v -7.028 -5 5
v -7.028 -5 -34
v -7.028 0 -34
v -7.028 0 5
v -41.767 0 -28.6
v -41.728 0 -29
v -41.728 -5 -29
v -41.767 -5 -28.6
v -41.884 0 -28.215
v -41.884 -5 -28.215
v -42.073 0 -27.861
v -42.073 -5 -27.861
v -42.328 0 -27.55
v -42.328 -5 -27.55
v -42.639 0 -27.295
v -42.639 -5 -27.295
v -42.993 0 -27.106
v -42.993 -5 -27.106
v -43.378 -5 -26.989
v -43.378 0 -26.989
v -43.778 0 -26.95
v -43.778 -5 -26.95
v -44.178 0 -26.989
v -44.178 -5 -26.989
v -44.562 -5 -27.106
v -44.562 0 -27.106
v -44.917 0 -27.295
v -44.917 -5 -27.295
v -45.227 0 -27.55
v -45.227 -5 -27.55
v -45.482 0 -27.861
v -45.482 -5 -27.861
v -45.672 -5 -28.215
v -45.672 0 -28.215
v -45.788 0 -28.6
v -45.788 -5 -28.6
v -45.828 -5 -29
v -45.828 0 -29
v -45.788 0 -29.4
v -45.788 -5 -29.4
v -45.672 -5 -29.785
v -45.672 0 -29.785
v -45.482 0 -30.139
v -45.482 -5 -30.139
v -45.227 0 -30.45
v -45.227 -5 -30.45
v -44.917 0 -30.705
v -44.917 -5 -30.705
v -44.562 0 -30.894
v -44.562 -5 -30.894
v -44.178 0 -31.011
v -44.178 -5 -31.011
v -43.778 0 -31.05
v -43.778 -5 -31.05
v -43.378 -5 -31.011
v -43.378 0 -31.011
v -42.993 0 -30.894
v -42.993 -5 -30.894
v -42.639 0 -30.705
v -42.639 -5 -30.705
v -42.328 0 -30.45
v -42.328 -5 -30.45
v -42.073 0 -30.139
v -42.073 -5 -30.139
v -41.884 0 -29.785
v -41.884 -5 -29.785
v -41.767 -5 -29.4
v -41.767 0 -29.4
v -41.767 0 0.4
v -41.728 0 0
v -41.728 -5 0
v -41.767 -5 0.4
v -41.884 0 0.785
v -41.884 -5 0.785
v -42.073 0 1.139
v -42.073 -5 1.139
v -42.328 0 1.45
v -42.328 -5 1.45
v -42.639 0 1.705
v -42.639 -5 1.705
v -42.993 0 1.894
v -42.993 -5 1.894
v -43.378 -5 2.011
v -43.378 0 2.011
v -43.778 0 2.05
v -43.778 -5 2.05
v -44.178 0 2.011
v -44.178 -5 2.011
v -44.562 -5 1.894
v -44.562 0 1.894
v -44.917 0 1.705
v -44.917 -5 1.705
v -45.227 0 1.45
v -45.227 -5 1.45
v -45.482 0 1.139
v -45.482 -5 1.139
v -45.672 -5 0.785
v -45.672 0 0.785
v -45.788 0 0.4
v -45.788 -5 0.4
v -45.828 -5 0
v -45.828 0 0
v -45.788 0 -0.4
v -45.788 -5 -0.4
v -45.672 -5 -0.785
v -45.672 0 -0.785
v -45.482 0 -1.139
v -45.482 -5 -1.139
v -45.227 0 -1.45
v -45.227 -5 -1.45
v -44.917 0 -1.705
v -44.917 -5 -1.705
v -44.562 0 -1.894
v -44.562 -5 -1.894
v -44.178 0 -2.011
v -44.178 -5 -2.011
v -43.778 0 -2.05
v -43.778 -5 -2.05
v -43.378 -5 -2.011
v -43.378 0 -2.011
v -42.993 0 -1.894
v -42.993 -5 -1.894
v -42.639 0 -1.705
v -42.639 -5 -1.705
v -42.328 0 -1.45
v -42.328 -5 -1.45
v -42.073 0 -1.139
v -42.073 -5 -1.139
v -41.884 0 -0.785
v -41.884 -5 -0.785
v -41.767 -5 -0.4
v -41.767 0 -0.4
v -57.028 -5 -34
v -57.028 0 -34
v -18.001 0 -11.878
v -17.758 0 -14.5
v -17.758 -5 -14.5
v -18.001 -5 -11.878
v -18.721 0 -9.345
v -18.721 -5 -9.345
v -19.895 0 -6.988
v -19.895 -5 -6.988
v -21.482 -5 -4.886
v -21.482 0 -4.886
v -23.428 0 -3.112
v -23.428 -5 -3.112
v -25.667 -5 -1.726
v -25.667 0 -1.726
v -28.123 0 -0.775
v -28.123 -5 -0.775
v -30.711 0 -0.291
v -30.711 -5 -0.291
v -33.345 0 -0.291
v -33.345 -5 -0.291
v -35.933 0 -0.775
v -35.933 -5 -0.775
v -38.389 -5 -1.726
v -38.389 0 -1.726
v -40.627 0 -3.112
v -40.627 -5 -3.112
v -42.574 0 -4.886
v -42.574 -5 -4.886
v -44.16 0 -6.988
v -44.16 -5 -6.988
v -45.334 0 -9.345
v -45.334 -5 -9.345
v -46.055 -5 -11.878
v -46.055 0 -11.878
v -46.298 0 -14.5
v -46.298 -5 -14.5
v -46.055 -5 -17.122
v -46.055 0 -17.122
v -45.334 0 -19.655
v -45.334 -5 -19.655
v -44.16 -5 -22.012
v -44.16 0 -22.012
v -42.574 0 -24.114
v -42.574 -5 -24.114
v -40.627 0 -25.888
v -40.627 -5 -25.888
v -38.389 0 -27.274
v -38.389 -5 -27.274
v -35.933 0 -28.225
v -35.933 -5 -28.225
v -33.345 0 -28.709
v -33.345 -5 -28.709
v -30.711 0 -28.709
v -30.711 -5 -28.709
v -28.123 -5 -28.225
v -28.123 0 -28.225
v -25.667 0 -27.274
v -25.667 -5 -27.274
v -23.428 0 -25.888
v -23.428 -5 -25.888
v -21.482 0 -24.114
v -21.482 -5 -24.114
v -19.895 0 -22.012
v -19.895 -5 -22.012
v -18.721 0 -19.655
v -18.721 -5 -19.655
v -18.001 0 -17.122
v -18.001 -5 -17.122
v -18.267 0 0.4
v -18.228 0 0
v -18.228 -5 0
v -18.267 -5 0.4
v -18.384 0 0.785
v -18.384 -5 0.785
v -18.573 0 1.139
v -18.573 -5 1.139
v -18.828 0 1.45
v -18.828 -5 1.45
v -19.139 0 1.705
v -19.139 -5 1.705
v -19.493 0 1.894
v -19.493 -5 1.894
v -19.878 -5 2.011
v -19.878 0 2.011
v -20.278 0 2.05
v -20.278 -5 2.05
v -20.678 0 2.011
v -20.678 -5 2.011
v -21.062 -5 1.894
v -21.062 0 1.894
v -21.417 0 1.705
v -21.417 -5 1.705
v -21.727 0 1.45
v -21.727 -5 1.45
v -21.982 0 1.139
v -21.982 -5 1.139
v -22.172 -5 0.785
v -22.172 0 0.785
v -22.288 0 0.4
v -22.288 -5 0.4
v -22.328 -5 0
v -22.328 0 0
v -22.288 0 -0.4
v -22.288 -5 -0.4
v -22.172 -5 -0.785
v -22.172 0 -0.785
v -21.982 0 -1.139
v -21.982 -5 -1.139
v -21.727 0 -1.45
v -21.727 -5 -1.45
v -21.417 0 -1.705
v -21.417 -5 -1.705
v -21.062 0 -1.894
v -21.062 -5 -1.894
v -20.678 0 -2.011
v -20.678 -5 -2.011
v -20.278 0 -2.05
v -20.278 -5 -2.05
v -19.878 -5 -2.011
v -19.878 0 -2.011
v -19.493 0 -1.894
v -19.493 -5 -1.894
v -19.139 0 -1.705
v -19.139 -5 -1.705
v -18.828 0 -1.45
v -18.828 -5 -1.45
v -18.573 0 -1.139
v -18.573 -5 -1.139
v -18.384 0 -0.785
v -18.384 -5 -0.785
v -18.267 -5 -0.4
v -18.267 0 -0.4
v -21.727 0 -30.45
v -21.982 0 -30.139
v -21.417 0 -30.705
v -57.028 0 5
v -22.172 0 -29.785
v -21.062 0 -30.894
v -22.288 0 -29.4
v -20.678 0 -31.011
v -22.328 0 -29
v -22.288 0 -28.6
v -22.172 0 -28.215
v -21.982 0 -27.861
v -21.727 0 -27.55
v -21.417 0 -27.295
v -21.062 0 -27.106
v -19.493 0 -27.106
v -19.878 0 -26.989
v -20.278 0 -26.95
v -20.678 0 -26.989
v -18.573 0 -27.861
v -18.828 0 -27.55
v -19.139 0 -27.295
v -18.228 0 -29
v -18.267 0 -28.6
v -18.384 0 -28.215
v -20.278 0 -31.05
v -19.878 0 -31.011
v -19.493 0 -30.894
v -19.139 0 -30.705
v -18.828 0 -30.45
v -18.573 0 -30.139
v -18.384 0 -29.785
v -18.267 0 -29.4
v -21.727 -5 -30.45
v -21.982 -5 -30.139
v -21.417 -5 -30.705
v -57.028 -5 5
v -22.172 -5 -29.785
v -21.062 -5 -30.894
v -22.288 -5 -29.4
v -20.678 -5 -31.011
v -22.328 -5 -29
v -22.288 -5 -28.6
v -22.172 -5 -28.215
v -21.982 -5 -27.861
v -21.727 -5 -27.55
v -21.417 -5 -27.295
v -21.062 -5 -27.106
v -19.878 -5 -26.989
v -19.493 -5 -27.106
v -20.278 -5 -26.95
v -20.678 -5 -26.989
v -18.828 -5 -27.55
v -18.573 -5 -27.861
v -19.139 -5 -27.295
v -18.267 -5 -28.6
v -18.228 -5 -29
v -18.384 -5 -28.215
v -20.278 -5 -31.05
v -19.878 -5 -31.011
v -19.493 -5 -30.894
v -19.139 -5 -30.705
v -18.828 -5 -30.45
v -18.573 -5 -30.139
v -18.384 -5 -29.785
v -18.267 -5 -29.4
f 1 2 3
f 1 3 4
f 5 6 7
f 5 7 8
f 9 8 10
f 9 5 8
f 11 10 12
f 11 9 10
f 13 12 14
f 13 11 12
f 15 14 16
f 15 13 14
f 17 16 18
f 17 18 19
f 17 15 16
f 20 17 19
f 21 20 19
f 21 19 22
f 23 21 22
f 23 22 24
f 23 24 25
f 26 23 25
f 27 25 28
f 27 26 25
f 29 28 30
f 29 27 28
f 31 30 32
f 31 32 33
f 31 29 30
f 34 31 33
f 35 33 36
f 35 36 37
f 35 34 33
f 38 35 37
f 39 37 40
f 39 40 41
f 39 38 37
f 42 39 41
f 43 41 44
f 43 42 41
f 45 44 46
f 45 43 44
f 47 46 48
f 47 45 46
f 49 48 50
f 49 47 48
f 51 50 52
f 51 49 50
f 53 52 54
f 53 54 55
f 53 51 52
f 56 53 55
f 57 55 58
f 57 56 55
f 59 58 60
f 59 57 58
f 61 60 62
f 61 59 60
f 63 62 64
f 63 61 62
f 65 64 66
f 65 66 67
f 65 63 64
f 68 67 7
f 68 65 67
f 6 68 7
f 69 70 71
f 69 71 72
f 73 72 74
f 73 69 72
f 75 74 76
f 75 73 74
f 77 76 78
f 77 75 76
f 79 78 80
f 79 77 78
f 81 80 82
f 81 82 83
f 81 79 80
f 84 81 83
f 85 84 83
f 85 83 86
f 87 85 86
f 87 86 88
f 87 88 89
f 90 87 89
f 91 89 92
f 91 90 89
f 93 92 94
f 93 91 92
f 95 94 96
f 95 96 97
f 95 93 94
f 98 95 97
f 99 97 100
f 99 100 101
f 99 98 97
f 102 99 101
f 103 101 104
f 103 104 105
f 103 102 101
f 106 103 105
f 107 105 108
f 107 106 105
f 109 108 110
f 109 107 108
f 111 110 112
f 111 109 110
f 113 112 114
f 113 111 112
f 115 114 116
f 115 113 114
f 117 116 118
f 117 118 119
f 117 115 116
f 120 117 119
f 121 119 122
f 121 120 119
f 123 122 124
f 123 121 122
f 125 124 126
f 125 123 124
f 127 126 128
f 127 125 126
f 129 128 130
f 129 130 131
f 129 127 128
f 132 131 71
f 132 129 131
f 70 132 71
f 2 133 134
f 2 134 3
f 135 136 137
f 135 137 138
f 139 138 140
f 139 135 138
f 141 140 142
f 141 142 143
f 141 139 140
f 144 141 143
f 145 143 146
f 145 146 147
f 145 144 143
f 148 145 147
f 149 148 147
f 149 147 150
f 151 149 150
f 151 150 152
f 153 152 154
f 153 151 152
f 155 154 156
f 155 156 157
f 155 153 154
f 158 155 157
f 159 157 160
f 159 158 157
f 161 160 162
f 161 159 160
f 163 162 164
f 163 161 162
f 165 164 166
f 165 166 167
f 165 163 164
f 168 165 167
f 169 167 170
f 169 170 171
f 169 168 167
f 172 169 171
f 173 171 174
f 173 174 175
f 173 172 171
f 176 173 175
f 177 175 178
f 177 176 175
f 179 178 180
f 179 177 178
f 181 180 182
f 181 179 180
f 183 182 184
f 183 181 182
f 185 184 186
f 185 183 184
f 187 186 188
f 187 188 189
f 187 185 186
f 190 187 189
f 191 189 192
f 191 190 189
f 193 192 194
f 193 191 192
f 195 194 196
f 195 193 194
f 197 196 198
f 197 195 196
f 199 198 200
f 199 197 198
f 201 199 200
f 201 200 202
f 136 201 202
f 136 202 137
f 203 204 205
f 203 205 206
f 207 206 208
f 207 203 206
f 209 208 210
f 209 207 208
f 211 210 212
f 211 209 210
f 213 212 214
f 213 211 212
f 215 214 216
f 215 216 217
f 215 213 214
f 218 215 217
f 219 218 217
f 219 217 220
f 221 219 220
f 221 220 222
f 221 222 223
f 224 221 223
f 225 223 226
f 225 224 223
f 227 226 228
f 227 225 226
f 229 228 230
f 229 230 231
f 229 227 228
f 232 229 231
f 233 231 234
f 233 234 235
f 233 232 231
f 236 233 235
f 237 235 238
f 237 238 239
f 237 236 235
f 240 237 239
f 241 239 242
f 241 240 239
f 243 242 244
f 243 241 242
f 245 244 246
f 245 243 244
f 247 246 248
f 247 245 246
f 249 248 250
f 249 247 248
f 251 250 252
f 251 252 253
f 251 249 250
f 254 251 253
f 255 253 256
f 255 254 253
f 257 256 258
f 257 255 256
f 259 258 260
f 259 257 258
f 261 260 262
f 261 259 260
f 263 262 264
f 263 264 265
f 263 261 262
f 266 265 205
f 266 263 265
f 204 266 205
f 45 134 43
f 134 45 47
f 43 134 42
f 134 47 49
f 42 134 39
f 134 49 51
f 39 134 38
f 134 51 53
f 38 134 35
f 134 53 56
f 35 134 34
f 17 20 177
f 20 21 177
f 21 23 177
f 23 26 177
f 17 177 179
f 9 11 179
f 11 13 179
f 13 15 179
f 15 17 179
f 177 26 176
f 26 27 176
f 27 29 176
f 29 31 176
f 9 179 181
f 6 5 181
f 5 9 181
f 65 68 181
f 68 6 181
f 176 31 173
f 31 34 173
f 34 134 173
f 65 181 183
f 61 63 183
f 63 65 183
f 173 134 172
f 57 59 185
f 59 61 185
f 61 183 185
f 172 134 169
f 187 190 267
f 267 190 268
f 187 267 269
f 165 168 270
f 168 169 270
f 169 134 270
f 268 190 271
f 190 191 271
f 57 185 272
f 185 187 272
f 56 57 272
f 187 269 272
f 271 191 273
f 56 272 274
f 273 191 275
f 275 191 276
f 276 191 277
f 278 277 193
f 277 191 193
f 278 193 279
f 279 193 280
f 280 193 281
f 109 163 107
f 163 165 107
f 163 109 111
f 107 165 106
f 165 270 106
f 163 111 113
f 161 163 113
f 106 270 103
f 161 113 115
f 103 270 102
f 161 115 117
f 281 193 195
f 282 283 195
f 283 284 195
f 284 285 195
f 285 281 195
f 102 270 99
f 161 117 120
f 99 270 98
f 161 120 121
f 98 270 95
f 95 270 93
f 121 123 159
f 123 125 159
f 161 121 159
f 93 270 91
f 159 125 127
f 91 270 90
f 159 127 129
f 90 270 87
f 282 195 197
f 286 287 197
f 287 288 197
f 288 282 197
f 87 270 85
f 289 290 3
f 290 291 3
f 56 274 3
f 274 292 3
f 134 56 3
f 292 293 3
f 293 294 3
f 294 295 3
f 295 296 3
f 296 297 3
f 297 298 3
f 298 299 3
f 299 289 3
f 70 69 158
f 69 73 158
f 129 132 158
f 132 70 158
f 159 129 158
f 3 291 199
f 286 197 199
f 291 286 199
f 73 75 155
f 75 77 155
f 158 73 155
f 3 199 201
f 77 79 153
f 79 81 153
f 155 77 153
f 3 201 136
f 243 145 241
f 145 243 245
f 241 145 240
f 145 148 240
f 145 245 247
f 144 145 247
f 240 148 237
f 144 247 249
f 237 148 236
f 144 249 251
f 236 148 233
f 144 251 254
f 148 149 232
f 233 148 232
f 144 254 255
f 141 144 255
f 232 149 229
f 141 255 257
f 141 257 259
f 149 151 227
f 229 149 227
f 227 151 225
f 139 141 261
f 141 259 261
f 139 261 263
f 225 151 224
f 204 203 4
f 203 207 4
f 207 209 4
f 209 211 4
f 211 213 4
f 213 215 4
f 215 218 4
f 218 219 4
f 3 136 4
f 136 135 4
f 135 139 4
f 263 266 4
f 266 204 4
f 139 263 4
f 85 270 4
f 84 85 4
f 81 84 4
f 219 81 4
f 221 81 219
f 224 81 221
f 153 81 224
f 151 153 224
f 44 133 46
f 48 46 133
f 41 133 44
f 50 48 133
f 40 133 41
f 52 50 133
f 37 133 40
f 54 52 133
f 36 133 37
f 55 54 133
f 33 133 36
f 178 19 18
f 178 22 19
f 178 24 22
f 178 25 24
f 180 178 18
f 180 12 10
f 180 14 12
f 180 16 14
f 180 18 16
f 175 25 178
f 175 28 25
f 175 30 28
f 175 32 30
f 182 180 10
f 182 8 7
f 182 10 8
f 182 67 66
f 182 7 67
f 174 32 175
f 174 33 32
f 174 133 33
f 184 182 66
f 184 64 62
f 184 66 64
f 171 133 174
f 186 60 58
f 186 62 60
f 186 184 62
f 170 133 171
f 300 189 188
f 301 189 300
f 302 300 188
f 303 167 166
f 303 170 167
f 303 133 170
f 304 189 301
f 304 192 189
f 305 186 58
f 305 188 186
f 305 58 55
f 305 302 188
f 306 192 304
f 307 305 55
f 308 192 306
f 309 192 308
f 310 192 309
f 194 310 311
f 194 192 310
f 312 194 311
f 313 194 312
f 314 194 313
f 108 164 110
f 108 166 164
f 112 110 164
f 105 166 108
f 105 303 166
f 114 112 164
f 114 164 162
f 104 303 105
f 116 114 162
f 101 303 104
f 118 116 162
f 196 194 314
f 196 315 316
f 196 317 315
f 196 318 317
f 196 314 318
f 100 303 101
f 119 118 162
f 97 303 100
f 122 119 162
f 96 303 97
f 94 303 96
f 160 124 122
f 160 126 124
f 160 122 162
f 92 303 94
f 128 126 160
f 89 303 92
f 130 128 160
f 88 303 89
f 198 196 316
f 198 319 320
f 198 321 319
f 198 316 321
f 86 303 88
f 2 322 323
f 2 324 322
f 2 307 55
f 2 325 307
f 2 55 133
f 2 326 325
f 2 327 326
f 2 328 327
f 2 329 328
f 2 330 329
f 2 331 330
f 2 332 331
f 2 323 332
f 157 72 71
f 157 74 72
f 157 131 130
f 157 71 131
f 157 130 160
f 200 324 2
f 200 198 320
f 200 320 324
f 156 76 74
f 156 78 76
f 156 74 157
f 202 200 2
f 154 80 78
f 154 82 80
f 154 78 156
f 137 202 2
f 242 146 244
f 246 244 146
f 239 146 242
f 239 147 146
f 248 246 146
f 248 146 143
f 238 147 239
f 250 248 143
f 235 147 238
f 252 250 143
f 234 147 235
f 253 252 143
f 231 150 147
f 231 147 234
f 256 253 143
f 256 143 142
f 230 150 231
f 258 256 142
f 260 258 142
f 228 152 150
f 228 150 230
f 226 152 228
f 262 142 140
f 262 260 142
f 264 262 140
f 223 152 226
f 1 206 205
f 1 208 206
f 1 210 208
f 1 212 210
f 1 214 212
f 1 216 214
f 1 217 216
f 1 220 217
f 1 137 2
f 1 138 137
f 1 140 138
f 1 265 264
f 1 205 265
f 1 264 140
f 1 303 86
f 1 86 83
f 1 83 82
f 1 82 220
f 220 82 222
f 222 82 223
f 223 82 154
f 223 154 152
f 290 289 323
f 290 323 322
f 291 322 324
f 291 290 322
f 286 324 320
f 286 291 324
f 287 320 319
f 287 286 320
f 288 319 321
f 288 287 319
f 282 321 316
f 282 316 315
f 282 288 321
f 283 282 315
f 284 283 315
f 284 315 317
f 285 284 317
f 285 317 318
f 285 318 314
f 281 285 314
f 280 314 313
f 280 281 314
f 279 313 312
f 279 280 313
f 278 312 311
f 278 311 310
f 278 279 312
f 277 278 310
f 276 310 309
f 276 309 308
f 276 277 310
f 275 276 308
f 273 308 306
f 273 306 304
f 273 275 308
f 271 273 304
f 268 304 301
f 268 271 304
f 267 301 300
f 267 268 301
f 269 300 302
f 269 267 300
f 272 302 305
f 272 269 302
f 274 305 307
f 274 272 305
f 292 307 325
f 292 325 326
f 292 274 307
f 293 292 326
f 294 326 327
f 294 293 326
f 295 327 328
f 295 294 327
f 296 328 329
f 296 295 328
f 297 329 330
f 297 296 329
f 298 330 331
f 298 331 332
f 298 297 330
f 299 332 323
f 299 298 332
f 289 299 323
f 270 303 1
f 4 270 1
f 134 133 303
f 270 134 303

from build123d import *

# Parameters (mm, degrees)
F0_W     = 33.5
F0_H     = 39
F0_R     = 2.05
F0_R_2   = 14.27
F1_DEPTH = 5
F2_W     = 8.25
F2_H     = 39
F3_DEPTH = 5


with BuildPart() as f1:
    # F0 (on Front) → F1 (new body)
    with BuildSketch(Plane.XZ):
        with Locations((-32.0278543325, -14.5)):
            Rectangle(F0_W, F0_H)
        with Locations((-43.7778543325, -29)):
            Circle(F0_R, mode=Mode.SUBTRACT)
        with Locations((-20.2778543325, -29)):
            Circle(F0_R, mode=Mode.SUBTRACT)
        with Locations((-43.7778543325, 0)):
            Circle(F0_R, mode=Mode.SUBTRACT)
        with Locations((-32.0278543325, -14.5)):
            Circle(F0_R_2, mode=Mode.SUBTRACT)
        with Locations((-20.2778543325, 0)):
            Circle(F0_R, mode=Mode.SUBTRACT)
    extrude(amount=F1_DEPTH)

    # F2 (on face) → F3 (join, through all)
    with BuildSketch(Plane.XZ.offset(5)):
        with Locations((-52.9028543325, -14.5)):
            Rectangle(F2_W, F2_H)
        with Locations((-11.1528543325, -14.5)):
            Rectangle(F2_W, F2_H)
    extrude(amount=-F3_DEPTH)


solid = f1.part
